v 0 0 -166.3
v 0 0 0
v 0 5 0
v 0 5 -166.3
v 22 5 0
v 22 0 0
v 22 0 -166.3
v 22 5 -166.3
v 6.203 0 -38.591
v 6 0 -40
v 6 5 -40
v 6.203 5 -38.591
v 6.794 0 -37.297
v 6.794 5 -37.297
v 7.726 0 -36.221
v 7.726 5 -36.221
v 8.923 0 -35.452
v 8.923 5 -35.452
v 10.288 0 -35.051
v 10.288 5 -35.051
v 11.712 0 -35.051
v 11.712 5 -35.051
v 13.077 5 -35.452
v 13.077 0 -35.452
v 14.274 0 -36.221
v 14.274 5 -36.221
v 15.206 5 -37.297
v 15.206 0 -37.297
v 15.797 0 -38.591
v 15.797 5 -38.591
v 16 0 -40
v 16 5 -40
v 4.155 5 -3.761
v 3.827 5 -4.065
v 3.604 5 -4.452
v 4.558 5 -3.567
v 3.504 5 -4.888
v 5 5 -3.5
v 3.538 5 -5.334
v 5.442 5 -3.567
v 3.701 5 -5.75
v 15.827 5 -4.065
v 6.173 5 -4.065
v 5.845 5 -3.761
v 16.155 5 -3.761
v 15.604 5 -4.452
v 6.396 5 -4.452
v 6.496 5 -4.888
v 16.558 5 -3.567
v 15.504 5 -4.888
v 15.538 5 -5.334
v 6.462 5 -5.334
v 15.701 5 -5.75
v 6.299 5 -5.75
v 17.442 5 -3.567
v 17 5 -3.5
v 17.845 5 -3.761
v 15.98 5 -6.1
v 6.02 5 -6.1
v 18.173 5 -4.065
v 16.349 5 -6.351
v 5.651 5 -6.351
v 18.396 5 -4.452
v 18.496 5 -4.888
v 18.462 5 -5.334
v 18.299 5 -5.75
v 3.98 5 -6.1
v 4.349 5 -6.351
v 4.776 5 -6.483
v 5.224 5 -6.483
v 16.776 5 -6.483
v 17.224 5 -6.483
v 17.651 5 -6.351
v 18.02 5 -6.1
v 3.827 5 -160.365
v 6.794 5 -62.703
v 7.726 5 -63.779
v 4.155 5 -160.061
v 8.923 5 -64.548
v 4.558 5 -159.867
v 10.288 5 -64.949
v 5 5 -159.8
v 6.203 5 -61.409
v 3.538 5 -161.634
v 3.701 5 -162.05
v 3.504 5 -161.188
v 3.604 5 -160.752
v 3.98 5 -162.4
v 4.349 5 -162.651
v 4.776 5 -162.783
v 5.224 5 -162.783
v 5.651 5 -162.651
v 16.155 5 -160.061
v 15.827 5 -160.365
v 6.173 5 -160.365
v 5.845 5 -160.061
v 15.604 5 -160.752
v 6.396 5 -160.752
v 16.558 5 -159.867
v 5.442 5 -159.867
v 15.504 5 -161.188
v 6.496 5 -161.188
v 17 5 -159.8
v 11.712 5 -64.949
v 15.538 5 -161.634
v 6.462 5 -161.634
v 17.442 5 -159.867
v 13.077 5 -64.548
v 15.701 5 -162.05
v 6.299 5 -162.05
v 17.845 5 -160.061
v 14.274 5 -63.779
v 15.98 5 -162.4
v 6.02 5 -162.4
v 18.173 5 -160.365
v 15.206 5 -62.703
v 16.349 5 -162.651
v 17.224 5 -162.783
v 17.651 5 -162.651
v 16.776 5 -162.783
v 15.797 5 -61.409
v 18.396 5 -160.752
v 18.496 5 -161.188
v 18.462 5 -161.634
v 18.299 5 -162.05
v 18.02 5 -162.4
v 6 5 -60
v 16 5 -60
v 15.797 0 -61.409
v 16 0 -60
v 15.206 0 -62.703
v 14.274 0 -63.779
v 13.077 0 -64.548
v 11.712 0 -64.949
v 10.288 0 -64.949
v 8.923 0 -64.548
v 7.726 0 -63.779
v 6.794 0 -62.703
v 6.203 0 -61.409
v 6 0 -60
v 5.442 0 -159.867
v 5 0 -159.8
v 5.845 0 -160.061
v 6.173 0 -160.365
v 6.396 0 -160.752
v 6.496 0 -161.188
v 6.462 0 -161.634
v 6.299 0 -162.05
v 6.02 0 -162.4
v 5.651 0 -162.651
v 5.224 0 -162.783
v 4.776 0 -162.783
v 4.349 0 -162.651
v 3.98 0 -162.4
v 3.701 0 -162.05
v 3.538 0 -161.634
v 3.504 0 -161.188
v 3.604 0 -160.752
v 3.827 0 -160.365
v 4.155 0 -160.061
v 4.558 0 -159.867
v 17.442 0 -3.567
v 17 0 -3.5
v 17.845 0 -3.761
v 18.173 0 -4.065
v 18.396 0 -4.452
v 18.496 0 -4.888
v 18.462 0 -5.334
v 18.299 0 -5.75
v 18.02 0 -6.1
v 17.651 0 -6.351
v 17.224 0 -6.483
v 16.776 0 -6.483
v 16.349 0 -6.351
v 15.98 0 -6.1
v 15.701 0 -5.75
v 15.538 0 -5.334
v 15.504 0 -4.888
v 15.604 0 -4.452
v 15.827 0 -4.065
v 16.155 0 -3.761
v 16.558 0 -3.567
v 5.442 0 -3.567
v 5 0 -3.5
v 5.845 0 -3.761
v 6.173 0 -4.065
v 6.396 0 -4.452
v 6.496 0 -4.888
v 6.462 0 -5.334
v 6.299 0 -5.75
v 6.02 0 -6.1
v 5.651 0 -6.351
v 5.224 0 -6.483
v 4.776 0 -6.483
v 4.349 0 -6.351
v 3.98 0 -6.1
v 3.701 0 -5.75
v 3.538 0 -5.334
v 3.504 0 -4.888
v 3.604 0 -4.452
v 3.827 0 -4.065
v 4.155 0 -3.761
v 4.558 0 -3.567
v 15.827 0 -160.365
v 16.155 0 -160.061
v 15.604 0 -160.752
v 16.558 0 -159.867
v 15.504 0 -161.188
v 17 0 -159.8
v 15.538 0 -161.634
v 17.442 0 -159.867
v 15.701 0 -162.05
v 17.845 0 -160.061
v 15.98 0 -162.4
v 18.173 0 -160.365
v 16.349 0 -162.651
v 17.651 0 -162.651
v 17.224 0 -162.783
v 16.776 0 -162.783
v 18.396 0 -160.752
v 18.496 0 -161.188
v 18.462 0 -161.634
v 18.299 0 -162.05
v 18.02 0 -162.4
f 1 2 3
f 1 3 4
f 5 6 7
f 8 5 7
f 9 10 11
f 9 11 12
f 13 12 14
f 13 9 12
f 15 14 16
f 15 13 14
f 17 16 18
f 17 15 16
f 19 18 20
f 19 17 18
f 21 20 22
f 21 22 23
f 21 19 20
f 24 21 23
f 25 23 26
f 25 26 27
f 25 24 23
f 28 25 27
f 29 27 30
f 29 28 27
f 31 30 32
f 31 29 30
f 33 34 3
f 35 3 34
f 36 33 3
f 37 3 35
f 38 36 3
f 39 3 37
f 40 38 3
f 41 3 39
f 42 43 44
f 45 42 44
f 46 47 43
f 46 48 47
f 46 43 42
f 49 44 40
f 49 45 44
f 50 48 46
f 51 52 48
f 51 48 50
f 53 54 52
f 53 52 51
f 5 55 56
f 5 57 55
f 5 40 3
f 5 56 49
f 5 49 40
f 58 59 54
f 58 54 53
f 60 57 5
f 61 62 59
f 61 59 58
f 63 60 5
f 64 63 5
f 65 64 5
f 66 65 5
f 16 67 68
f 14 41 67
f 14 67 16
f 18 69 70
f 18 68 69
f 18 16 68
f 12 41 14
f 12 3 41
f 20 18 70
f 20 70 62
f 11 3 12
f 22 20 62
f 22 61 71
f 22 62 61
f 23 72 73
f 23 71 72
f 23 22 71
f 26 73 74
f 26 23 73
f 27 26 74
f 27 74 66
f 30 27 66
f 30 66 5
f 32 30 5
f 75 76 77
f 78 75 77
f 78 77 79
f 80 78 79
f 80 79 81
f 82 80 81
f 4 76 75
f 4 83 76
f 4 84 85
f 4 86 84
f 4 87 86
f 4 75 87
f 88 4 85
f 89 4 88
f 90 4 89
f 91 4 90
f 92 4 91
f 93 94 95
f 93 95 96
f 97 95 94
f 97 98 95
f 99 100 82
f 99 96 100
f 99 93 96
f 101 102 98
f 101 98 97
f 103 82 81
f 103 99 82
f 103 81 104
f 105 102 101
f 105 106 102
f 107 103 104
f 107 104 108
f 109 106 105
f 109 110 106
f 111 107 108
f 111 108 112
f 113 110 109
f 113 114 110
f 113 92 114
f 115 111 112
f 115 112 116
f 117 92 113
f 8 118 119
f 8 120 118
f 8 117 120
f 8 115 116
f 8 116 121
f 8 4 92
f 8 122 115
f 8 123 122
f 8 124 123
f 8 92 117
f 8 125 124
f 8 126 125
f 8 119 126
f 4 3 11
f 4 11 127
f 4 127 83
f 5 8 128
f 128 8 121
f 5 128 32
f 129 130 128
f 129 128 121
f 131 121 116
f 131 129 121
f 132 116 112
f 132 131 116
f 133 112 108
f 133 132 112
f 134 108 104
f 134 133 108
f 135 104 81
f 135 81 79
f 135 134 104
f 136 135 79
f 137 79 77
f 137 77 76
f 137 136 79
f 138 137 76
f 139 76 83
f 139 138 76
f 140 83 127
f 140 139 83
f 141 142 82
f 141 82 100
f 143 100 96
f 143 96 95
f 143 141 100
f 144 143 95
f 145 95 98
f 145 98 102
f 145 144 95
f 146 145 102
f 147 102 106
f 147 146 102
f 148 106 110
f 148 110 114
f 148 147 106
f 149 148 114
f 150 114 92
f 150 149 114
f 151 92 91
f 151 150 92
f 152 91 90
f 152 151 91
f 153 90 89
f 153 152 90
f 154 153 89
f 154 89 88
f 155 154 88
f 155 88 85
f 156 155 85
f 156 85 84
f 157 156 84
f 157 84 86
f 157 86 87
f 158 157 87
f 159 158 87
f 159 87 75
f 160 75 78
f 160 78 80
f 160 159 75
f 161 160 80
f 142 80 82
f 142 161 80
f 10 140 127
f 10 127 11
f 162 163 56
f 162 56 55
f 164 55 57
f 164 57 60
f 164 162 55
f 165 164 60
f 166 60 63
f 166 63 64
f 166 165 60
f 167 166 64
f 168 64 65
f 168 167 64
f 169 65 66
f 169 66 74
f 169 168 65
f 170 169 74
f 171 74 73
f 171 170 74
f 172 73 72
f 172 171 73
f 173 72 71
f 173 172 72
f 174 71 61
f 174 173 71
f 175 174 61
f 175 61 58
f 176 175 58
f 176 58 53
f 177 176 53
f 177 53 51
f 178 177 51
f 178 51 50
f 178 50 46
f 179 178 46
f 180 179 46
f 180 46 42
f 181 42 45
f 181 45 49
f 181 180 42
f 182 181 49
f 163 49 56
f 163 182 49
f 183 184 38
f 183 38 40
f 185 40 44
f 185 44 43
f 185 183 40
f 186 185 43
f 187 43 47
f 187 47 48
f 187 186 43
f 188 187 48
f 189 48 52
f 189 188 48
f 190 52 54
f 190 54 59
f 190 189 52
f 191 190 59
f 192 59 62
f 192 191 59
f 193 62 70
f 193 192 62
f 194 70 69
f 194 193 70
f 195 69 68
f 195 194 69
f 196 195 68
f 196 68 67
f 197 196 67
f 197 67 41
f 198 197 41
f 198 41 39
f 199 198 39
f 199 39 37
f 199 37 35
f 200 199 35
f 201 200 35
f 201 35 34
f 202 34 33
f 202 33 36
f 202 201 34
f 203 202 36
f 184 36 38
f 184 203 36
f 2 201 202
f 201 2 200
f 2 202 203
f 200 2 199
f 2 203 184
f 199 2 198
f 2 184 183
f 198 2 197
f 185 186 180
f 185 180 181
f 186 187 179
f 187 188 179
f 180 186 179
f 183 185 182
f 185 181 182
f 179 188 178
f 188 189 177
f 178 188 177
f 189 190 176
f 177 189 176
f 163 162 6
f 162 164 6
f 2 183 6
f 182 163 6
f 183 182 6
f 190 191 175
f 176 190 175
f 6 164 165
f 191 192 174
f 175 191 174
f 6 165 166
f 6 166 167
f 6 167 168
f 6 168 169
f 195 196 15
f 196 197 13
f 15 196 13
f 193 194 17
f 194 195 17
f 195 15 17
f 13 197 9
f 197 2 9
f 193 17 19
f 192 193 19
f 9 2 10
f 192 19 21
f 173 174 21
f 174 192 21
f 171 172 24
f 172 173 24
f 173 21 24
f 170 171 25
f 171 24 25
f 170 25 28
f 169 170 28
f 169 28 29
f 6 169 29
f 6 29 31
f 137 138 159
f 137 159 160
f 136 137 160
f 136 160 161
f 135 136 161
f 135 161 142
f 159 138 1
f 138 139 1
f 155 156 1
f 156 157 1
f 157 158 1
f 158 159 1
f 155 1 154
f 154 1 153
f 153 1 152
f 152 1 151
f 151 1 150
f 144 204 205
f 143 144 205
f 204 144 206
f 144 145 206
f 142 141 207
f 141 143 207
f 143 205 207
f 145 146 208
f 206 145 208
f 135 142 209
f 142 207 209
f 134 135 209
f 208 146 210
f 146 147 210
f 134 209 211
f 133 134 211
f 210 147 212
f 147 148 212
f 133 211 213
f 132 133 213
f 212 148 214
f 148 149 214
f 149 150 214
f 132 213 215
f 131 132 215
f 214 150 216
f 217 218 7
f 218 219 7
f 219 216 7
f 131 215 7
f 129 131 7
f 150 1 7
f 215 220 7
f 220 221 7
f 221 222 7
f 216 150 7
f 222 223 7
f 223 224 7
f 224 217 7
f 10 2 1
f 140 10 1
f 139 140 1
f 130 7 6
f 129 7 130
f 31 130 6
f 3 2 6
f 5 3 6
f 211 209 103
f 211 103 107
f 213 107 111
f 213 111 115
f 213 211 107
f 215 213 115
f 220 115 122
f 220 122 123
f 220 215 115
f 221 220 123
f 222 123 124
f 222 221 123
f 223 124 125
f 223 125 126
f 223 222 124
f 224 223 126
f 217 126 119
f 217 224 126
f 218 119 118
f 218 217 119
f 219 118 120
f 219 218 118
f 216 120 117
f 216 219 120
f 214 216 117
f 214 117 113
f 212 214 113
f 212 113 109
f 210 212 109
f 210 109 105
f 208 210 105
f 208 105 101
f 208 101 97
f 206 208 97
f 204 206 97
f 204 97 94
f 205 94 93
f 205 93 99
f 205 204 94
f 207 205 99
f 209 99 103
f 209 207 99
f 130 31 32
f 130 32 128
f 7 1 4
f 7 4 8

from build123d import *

# Parameters (mm, degrees)
SKETCH1_W           = 22
SKETCH1_H           = 166.3
SKETCH1_R           = 1.5
BOSS_EXTRUDE1_DEPTH = 5
CUT_EXTRUDE1_DEPTH  = 5


with BuildPart() as part:
    # Sketch1 → Boss-Extrude1 (new body)
    with BuildSketch(Plane(origin=(0, 0, 0), x_dir=(1, 0, 0), z_dir=(0, 1, 0))):
        with Locations((11, 83.15)):
            Rectangle(SKETCH1_W, SKETCH1_H)
        with Locations(Location((5, 161.3, 0), (0, 0, 270))):
            Circle(SKETCH1_R, mode=Mode.SUBTRACT)
        with Locations(Location((17, 161.3, 0), (0, 0, 270))):
            Circle(SKETCH1_R, mode=Mode.SUBTRACT)
        with Locations(Location((17, 5, 0), (0, 0, 270))):
            Circle(SKETCH1_R, mode=Mode.SUBTRACT)
        with Locations(Location((5, 5, 0), (0, 0, 270))):
            Circle(SKETCH1_R, mode=Mode.SUBTRACT)
    extrude(amount=BOSS_EXTRUDE1_DEPTH)

    # Sketch2 → Cut-Extrude1 (cut)
    with BuildSketch(Plane(origin=(0, 0, 0), x_dir=(-1, 0, 0), z_dir=(0, -1, 0))):
        with BuildLine():
            Line((-16, 40), (-16, 60))
            ThreePointArc((-16, 60), (-11, 65), (-6, 60))
            Line((-6, 60), (-6, 40))
            ThreePointArc((-6, 40), (-11, 35), (-16, 40))
        make_face()
    extrude(amount=-CUT_EXTRUDE1_DEPTH, mode=Mode.SUBTRACT)


solid = part.part
